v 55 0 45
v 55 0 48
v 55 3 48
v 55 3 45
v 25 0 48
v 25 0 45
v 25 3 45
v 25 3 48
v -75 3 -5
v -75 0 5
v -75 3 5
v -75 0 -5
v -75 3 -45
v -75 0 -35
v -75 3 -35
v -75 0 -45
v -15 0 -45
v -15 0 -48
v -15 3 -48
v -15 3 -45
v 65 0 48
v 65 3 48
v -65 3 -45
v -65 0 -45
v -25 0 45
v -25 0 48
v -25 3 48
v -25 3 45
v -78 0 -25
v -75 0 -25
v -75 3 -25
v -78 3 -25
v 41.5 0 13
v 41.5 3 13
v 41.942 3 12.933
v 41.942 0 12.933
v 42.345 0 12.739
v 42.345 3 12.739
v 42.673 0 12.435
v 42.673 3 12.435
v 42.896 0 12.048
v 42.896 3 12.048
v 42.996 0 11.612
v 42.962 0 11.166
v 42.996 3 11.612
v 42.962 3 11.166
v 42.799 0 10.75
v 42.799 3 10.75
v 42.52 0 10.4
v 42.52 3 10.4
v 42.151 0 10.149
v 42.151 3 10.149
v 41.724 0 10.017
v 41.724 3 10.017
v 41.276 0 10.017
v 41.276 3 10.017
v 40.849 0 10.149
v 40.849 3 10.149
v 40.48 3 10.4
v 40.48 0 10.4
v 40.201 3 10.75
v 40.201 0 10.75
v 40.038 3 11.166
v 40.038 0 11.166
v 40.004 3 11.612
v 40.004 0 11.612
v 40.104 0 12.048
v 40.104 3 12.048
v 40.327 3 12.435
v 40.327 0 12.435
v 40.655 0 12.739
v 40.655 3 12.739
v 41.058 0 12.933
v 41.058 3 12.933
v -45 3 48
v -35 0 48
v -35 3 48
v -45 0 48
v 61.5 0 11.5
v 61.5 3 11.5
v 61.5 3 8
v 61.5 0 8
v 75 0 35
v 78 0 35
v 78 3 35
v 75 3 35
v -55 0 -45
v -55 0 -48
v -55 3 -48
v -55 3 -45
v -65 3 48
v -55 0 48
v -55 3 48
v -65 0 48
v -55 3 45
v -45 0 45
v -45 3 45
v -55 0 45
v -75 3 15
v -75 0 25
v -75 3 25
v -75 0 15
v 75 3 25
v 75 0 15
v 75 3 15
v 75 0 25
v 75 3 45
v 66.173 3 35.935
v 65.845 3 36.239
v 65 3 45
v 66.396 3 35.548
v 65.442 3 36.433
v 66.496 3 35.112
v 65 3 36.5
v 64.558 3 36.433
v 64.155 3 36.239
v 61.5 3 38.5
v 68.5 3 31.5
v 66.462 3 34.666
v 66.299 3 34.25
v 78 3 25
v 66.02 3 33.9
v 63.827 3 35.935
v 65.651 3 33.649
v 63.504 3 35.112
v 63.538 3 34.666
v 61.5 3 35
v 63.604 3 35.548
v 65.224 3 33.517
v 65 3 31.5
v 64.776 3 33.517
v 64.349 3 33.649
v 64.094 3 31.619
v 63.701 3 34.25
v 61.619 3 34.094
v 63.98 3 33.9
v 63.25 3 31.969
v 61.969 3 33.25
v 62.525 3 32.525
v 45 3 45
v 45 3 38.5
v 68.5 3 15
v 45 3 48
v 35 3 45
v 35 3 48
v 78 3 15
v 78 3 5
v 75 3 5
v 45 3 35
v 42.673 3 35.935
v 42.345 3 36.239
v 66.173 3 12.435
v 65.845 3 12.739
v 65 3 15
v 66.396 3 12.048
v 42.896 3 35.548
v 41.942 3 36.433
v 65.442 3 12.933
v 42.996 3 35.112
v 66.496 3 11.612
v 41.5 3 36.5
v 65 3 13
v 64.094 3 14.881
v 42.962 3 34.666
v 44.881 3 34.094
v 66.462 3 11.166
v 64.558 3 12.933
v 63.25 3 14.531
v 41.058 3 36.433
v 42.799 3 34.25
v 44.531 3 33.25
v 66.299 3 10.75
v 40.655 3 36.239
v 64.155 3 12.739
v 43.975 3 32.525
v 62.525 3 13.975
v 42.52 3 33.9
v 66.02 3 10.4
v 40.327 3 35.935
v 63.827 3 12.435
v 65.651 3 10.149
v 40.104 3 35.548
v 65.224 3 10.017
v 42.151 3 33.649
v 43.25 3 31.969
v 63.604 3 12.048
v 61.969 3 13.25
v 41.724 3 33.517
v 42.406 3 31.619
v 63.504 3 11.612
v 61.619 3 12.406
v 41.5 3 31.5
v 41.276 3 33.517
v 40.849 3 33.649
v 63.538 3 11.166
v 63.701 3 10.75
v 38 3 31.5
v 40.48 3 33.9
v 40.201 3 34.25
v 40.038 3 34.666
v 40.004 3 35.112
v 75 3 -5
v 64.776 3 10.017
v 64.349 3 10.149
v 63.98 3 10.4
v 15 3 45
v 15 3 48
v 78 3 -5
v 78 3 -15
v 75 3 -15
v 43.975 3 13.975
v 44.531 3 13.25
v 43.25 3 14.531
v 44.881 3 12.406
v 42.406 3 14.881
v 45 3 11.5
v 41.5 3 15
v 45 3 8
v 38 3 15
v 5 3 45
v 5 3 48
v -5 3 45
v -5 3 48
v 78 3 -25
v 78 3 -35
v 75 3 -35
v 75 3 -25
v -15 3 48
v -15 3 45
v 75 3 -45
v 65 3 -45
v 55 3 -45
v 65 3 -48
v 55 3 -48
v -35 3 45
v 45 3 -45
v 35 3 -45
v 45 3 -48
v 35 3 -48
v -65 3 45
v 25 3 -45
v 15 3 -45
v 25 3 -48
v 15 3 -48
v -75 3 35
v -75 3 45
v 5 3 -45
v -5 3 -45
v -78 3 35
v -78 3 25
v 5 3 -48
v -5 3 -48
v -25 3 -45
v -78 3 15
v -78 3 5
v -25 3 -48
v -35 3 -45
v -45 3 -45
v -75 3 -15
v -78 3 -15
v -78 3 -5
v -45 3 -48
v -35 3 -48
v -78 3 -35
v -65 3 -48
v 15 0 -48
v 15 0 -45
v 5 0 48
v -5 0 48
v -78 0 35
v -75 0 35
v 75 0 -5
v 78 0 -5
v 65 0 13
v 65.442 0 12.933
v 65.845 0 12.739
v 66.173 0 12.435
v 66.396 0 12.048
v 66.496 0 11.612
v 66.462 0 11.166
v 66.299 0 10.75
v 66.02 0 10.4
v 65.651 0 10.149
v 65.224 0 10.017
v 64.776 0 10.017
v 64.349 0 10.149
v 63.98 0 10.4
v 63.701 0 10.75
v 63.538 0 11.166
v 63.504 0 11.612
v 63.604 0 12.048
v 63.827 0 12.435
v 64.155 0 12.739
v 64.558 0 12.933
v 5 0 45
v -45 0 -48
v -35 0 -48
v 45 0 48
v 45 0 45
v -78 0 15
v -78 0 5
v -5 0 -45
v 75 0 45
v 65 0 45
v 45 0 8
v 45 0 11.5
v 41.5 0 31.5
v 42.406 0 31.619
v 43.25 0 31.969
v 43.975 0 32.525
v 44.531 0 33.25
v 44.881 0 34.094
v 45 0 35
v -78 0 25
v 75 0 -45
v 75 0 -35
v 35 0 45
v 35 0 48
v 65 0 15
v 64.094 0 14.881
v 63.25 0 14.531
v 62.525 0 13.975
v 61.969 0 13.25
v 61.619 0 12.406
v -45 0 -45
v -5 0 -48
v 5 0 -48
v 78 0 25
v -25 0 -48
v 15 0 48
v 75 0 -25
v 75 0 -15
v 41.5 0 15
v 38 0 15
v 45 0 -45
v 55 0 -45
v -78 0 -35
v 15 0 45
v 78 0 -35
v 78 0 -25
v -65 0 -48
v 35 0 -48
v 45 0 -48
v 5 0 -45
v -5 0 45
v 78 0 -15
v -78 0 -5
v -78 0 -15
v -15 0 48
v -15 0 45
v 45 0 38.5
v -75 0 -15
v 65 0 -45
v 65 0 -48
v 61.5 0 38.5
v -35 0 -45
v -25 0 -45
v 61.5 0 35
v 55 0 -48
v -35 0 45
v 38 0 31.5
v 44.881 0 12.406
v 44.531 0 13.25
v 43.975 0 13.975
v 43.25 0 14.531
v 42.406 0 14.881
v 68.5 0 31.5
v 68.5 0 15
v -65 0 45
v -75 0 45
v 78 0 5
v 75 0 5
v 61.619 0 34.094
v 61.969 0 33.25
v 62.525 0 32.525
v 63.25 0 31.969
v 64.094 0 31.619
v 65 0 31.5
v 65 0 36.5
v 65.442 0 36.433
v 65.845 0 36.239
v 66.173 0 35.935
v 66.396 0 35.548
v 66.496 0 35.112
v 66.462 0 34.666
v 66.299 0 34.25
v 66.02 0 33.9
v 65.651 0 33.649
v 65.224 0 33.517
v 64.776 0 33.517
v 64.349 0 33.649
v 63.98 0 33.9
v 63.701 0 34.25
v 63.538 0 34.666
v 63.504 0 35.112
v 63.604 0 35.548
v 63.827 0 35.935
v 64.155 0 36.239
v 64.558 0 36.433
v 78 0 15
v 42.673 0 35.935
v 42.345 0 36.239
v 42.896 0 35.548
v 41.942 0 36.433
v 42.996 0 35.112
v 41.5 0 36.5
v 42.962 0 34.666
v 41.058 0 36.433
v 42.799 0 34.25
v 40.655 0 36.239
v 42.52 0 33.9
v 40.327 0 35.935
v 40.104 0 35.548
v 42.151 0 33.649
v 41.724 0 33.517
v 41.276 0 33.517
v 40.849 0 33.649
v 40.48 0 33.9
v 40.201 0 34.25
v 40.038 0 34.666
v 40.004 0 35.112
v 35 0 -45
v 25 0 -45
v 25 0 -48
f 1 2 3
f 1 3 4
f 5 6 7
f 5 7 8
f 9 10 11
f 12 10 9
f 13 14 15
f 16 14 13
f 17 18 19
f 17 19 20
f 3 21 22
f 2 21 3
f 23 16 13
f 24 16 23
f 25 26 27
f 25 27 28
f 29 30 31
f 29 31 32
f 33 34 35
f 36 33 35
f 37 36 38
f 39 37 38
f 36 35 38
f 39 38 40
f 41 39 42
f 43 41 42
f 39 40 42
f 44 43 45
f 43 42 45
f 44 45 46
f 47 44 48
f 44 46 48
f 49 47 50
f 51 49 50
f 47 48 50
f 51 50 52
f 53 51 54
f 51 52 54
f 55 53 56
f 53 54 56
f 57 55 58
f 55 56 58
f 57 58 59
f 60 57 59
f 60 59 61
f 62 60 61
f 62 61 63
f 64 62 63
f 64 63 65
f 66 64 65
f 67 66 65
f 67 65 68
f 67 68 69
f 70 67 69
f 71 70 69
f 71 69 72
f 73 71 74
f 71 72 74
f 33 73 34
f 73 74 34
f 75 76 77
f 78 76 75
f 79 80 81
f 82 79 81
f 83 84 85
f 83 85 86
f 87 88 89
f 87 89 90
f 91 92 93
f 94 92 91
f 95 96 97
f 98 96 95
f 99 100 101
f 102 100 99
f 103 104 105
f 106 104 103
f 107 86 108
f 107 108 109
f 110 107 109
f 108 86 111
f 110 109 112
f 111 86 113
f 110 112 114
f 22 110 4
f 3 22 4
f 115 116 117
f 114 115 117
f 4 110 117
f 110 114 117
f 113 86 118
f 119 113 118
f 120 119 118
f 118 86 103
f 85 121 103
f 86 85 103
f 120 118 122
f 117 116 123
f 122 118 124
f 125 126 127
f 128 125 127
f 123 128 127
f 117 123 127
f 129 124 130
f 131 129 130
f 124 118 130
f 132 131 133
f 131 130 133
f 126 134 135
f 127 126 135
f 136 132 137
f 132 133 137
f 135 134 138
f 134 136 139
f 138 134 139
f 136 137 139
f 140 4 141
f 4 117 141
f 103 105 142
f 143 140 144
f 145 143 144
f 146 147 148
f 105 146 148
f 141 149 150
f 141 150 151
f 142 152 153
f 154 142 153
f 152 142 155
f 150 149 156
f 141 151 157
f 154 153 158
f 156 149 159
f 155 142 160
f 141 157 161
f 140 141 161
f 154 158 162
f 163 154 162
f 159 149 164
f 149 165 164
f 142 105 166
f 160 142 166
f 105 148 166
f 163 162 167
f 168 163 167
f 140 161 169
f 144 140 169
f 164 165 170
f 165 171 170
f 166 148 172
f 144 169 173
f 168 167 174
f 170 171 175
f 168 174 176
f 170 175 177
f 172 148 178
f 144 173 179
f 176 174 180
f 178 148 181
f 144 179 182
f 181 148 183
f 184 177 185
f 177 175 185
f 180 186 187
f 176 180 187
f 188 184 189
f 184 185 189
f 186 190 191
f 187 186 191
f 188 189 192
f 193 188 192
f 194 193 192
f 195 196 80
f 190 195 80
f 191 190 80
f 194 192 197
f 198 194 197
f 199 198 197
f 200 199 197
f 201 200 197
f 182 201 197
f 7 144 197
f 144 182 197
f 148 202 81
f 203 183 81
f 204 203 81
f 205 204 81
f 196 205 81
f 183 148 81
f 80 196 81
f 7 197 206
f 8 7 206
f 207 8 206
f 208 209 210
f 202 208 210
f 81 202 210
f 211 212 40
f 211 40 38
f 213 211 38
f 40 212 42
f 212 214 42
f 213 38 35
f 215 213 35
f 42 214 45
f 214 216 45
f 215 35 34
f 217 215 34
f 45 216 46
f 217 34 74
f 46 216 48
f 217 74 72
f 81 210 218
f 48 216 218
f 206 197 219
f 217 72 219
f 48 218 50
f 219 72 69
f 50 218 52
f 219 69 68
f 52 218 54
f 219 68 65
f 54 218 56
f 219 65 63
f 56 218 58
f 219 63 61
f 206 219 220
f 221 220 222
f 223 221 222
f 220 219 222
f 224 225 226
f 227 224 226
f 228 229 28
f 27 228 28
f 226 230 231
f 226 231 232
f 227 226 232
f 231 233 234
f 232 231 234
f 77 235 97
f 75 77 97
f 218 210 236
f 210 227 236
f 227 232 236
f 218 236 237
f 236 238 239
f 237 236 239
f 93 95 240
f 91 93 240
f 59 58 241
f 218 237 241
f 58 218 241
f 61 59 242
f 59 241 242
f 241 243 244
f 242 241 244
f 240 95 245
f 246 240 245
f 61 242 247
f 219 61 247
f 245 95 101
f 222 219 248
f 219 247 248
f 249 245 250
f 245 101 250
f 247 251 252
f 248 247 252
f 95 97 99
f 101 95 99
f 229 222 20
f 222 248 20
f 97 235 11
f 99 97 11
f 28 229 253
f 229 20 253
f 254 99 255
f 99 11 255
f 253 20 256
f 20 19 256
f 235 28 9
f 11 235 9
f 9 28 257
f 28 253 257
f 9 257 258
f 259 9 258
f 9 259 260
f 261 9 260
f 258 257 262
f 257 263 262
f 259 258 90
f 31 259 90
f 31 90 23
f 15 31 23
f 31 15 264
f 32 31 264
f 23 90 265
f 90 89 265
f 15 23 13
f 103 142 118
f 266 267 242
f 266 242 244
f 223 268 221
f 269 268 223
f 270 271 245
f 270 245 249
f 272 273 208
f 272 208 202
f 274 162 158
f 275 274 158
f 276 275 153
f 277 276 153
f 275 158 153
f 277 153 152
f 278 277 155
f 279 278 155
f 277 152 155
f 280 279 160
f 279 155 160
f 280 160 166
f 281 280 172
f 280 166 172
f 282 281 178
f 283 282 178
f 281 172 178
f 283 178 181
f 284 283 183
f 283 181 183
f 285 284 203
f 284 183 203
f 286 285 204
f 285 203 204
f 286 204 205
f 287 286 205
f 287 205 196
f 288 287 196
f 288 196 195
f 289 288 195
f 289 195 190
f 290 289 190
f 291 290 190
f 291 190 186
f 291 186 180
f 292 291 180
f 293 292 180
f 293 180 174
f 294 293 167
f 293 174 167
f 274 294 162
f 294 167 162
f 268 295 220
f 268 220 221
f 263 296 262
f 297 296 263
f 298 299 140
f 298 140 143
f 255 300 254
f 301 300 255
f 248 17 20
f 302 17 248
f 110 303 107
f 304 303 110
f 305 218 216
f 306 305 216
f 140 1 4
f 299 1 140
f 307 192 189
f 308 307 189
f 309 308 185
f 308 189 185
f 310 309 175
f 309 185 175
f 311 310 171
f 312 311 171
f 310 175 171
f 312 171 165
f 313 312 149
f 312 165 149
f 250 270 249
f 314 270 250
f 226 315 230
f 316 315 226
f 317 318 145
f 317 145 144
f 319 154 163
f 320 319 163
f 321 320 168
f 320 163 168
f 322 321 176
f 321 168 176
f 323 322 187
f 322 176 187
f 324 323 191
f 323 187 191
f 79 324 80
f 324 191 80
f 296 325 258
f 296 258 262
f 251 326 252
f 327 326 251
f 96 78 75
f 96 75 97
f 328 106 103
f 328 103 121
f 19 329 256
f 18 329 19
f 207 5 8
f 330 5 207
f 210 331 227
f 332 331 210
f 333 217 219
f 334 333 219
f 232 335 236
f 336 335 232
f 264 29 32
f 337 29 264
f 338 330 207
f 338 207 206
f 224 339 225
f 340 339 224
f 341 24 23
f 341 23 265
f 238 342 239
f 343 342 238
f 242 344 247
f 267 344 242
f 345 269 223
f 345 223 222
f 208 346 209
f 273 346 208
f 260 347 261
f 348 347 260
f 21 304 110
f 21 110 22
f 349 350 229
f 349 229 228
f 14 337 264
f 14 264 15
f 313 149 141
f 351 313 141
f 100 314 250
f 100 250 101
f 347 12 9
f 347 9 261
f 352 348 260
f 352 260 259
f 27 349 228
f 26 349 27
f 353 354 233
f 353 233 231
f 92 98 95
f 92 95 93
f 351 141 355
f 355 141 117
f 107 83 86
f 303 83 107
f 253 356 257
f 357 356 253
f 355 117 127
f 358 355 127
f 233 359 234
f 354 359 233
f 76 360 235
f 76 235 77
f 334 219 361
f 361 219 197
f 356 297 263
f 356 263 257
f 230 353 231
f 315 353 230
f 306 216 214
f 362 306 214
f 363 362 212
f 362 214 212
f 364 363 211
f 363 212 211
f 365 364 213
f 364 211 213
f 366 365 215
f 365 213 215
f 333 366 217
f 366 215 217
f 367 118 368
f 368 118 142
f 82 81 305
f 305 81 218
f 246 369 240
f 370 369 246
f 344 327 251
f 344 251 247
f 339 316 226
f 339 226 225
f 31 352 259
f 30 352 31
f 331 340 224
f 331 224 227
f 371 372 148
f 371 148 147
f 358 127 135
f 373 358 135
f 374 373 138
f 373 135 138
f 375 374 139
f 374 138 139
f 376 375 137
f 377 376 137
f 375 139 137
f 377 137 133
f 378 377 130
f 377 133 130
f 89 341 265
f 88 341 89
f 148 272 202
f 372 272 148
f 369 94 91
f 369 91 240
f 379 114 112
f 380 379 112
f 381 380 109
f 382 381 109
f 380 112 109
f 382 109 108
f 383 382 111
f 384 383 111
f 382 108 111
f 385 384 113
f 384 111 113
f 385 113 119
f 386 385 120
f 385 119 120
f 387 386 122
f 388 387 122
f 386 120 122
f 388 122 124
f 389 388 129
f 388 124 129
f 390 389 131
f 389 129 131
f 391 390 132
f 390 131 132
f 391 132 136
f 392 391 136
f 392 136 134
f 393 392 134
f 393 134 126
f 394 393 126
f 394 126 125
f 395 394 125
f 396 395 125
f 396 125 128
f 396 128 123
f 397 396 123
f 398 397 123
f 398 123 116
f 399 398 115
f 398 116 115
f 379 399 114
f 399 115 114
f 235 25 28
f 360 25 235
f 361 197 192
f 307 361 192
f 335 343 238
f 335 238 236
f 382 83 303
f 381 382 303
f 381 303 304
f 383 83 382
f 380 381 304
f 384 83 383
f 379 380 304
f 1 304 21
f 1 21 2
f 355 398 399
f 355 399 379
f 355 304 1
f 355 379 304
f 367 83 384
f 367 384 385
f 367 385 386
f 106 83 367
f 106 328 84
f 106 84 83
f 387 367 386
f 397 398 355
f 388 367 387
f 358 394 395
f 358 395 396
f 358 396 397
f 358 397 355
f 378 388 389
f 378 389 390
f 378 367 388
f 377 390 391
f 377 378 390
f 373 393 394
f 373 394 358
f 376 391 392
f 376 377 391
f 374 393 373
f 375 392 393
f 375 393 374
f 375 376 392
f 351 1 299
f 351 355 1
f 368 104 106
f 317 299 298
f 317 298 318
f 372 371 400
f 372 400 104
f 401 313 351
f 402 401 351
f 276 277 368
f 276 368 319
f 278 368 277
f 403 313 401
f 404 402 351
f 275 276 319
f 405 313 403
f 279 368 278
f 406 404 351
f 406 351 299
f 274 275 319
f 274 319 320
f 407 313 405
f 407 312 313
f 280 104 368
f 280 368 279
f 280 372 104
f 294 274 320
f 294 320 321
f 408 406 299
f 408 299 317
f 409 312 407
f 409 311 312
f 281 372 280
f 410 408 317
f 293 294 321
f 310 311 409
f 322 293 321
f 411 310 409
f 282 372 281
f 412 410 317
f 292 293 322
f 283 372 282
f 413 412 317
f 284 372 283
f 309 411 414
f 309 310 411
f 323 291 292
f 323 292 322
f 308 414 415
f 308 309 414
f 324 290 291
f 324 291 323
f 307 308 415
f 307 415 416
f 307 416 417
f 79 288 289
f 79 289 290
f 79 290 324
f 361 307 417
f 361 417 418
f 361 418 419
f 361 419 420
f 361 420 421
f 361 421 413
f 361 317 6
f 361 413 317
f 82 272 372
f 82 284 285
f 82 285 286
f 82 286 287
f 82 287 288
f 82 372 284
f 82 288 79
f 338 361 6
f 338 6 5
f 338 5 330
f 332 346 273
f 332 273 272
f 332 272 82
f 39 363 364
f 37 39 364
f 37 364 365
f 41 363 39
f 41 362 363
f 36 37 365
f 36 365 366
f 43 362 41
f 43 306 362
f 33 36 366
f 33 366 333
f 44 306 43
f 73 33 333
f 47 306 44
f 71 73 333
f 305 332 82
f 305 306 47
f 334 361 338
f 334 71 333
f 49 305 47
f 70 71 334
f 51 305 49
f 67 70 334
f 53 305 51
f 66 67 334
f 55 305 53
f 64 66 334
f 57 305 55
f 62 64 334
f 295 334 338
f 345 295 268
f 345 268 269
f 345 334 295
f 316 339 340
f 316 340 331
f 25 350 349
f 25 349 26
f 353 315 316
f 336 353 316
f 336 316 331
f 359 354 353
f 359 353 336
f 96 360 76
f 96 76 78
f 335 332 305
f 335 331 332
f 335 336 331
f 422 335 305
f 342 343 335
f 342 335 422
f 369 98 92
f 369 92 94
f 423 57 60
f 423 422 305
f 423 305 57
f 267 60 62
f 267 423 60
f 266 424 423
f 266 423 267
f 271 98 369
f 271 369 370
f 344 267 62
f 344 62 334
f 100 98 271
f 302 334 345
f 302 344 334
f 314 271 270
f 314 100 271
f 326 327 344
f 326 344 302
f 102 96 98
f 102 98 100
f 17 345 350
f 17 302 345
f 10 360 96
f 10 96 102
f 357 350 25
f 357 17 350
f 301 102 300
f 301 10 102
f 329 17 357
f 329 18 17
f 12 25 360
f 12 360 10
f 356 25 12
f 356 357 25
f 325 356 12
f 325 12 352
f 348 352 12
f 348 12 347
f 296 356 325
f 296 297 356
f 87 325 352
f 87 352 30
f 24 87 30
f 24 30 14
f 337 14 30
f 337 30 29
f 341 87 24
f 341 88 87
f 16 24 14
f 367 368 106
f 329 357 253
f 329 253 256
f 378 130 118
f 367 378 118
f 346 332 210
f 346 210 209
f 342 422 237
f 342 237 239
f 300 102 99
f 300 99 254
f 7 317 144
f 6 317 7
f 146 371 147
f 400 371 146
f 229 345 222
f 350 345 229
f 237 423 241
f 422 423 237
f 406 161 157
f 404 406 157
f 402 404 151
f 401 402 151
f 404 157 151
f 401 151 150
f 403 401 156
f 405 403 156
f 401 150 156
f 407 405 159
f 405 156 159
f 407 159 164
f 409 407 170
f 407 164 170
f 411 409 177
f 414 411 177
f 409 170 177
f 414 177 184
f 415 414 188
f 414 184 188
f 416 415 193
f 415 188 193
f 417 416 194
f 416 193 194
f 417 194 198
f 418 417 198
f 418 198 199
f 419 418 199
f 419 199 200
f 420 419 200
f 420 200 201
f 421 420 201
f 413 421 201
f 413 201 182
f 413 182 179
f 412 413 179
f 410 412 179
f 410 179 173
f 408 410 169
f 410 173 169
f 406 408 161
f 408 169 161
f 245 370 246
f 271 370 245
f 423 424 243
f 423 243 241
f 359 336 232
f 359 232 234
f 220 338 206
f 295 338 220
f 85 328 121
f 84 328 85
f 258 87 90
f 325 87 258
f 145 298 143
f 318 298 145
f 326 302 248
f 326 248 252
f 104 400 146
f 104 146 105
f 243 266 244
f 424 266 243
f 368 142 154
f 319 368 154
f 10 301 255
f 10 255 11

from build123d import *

# Parameters (mm, degrees)
BOSS_EXTRUDE1_DEPTH = 3
SKETCH3_R           = 1.5
CUT_EXTRUDE2_DEPTH  = 3
CUT_EXTRUDE3_DEPTH  = 3


with BuildPart() as part:
    # Sketch1 → Boss-Extrude1 (new body)
    with BuildSketch(Plane(origin=(0, 0, 0), x_dir=(1, 0, 0), z_dir=(0, 1, 0))):
        Polygon((-5, 48), (5, 48), (5, 45), (15, 45), (15, 48), (25, 48), (25, 45), (35, 45), (35, 48), (45, 48), (45, 45), (55, 45), (55, 48), (65, 48), (65, 45), (75, 45), (75, 35), (78, 35), (78, 25), (75, 25), (75, 15), (78, 15), (78, 5), (75, 5), (75, -5), (78, -5), (78, -15), (75, -15), (75, -25), (78, -25), (78, -35), (75, -35), (75, -45), (65, -45), (65, -48), (55, -48), (55, -45), (45, -45), (45, -48), (35, -48), (35, -45), (25, -45), (25, -48), (15, -48), (15, -45), (5, -45), (5, -48), (-5, -48), (-5, -45), (-15, -45), (-15, -48), (-25, -48), (-25, -45), (-35, -45), (-35, -48), (-45, -48), (-45, -45), (-55, -45), (-55, -48), (-65, -48), (-65, -45), (-75, -45), (-75, -35), (-78, -35), (-78, -25), (-75, -25), (-75, -15), (-78, -15), (-78, -5), (-75, -5), (-75, 5), (-78, 5), (-78, 15), (-75, 15), (-75, 25), (-78, 25), (-78, 35), (-75, 35), (-75, 45), (-65, 45), (-65, 48), (-55, 48), (-55, 45), (-45, 45), (-45, 48), (-35, 48), (-35, 45), (-25, 45), (-25, 48), (-15, 48), (-15, 45), (-5, 45), align=None)
    extrude(amount=BOSS_EXTRUDE1_DEPTH)

    # Sketch3 → Cut-Extrude2 (cut)
    with BuildSketch(Plane(origin=(0, 3, 0), x_dir=(1, 0, 0), z_dir=(0, 1, 0))):
        with Locations(Location((41.5, -11.5, 0), (0, 0, 270))):
            Circle(SKETCH3_R)
        with Locations(Location((65, -11.5, 0), (0, 0, 270))):
            Circle(SKETCH3_R)
        with Locations(Location((65, -35, 0), (0, 0, 270))):
            Circle(SKETCH3_R)
        with Locations(Location((41.5, -35, 0), (0, 0, 270))):
            Circle(SKETCH3_R)
    extrude(amount=-CUT_EXTRUDE2_DEPTH, mode=Mode.SUBTRACT)

    # Sketch4 → Cut-Extrude3 (cut)
    with BuildSketch(Plane(origin=(0, 3, 0), x_dir=(1, 0, 0), z_dir=(0, 1, 0))):
        with BuildLine():
            Line((45, -35), (45, -38.5))
            Line((45, -38.5), (61.5, -38.5))
            Line((61.5, -38.5), (61.5, -35))
            ThreePointArc((61.5, -35), (62.525126266, -32.525126266), (65, -31.5))
            Line((65, -31.5), (68.5, -31.5))
            Line((68.5, -31.5), (68.5, -15))
            Line((68.5, -15), (65, -15))
            ThreePointArc((65, -15), (62.525126266, -13.974873734), (61.5, -11.5))
            Line((61.5, -11.5), (61.5, -8))
            Line((61.5, -8), (45, -8))
            Line((45, -8), (45, -11.5))
            ThreePointArc((45, -11.5), (43.974873734, -13.974873734), (41.5, -15))
            Line((41.5, -15), (38, -15))
            Line((38, -15), (38, -31.5))
            Line((38, -31.5), (41.5, -31.5))
            ThreePointArc((41.5, -31.5), (43.974873734, -32.525126266), (45, -35))
        make_face()
    extrude(amount=-CUT_EXTRUDE3_DEPTH, mode=Mode.SUBTRACT)


solid = part.part
